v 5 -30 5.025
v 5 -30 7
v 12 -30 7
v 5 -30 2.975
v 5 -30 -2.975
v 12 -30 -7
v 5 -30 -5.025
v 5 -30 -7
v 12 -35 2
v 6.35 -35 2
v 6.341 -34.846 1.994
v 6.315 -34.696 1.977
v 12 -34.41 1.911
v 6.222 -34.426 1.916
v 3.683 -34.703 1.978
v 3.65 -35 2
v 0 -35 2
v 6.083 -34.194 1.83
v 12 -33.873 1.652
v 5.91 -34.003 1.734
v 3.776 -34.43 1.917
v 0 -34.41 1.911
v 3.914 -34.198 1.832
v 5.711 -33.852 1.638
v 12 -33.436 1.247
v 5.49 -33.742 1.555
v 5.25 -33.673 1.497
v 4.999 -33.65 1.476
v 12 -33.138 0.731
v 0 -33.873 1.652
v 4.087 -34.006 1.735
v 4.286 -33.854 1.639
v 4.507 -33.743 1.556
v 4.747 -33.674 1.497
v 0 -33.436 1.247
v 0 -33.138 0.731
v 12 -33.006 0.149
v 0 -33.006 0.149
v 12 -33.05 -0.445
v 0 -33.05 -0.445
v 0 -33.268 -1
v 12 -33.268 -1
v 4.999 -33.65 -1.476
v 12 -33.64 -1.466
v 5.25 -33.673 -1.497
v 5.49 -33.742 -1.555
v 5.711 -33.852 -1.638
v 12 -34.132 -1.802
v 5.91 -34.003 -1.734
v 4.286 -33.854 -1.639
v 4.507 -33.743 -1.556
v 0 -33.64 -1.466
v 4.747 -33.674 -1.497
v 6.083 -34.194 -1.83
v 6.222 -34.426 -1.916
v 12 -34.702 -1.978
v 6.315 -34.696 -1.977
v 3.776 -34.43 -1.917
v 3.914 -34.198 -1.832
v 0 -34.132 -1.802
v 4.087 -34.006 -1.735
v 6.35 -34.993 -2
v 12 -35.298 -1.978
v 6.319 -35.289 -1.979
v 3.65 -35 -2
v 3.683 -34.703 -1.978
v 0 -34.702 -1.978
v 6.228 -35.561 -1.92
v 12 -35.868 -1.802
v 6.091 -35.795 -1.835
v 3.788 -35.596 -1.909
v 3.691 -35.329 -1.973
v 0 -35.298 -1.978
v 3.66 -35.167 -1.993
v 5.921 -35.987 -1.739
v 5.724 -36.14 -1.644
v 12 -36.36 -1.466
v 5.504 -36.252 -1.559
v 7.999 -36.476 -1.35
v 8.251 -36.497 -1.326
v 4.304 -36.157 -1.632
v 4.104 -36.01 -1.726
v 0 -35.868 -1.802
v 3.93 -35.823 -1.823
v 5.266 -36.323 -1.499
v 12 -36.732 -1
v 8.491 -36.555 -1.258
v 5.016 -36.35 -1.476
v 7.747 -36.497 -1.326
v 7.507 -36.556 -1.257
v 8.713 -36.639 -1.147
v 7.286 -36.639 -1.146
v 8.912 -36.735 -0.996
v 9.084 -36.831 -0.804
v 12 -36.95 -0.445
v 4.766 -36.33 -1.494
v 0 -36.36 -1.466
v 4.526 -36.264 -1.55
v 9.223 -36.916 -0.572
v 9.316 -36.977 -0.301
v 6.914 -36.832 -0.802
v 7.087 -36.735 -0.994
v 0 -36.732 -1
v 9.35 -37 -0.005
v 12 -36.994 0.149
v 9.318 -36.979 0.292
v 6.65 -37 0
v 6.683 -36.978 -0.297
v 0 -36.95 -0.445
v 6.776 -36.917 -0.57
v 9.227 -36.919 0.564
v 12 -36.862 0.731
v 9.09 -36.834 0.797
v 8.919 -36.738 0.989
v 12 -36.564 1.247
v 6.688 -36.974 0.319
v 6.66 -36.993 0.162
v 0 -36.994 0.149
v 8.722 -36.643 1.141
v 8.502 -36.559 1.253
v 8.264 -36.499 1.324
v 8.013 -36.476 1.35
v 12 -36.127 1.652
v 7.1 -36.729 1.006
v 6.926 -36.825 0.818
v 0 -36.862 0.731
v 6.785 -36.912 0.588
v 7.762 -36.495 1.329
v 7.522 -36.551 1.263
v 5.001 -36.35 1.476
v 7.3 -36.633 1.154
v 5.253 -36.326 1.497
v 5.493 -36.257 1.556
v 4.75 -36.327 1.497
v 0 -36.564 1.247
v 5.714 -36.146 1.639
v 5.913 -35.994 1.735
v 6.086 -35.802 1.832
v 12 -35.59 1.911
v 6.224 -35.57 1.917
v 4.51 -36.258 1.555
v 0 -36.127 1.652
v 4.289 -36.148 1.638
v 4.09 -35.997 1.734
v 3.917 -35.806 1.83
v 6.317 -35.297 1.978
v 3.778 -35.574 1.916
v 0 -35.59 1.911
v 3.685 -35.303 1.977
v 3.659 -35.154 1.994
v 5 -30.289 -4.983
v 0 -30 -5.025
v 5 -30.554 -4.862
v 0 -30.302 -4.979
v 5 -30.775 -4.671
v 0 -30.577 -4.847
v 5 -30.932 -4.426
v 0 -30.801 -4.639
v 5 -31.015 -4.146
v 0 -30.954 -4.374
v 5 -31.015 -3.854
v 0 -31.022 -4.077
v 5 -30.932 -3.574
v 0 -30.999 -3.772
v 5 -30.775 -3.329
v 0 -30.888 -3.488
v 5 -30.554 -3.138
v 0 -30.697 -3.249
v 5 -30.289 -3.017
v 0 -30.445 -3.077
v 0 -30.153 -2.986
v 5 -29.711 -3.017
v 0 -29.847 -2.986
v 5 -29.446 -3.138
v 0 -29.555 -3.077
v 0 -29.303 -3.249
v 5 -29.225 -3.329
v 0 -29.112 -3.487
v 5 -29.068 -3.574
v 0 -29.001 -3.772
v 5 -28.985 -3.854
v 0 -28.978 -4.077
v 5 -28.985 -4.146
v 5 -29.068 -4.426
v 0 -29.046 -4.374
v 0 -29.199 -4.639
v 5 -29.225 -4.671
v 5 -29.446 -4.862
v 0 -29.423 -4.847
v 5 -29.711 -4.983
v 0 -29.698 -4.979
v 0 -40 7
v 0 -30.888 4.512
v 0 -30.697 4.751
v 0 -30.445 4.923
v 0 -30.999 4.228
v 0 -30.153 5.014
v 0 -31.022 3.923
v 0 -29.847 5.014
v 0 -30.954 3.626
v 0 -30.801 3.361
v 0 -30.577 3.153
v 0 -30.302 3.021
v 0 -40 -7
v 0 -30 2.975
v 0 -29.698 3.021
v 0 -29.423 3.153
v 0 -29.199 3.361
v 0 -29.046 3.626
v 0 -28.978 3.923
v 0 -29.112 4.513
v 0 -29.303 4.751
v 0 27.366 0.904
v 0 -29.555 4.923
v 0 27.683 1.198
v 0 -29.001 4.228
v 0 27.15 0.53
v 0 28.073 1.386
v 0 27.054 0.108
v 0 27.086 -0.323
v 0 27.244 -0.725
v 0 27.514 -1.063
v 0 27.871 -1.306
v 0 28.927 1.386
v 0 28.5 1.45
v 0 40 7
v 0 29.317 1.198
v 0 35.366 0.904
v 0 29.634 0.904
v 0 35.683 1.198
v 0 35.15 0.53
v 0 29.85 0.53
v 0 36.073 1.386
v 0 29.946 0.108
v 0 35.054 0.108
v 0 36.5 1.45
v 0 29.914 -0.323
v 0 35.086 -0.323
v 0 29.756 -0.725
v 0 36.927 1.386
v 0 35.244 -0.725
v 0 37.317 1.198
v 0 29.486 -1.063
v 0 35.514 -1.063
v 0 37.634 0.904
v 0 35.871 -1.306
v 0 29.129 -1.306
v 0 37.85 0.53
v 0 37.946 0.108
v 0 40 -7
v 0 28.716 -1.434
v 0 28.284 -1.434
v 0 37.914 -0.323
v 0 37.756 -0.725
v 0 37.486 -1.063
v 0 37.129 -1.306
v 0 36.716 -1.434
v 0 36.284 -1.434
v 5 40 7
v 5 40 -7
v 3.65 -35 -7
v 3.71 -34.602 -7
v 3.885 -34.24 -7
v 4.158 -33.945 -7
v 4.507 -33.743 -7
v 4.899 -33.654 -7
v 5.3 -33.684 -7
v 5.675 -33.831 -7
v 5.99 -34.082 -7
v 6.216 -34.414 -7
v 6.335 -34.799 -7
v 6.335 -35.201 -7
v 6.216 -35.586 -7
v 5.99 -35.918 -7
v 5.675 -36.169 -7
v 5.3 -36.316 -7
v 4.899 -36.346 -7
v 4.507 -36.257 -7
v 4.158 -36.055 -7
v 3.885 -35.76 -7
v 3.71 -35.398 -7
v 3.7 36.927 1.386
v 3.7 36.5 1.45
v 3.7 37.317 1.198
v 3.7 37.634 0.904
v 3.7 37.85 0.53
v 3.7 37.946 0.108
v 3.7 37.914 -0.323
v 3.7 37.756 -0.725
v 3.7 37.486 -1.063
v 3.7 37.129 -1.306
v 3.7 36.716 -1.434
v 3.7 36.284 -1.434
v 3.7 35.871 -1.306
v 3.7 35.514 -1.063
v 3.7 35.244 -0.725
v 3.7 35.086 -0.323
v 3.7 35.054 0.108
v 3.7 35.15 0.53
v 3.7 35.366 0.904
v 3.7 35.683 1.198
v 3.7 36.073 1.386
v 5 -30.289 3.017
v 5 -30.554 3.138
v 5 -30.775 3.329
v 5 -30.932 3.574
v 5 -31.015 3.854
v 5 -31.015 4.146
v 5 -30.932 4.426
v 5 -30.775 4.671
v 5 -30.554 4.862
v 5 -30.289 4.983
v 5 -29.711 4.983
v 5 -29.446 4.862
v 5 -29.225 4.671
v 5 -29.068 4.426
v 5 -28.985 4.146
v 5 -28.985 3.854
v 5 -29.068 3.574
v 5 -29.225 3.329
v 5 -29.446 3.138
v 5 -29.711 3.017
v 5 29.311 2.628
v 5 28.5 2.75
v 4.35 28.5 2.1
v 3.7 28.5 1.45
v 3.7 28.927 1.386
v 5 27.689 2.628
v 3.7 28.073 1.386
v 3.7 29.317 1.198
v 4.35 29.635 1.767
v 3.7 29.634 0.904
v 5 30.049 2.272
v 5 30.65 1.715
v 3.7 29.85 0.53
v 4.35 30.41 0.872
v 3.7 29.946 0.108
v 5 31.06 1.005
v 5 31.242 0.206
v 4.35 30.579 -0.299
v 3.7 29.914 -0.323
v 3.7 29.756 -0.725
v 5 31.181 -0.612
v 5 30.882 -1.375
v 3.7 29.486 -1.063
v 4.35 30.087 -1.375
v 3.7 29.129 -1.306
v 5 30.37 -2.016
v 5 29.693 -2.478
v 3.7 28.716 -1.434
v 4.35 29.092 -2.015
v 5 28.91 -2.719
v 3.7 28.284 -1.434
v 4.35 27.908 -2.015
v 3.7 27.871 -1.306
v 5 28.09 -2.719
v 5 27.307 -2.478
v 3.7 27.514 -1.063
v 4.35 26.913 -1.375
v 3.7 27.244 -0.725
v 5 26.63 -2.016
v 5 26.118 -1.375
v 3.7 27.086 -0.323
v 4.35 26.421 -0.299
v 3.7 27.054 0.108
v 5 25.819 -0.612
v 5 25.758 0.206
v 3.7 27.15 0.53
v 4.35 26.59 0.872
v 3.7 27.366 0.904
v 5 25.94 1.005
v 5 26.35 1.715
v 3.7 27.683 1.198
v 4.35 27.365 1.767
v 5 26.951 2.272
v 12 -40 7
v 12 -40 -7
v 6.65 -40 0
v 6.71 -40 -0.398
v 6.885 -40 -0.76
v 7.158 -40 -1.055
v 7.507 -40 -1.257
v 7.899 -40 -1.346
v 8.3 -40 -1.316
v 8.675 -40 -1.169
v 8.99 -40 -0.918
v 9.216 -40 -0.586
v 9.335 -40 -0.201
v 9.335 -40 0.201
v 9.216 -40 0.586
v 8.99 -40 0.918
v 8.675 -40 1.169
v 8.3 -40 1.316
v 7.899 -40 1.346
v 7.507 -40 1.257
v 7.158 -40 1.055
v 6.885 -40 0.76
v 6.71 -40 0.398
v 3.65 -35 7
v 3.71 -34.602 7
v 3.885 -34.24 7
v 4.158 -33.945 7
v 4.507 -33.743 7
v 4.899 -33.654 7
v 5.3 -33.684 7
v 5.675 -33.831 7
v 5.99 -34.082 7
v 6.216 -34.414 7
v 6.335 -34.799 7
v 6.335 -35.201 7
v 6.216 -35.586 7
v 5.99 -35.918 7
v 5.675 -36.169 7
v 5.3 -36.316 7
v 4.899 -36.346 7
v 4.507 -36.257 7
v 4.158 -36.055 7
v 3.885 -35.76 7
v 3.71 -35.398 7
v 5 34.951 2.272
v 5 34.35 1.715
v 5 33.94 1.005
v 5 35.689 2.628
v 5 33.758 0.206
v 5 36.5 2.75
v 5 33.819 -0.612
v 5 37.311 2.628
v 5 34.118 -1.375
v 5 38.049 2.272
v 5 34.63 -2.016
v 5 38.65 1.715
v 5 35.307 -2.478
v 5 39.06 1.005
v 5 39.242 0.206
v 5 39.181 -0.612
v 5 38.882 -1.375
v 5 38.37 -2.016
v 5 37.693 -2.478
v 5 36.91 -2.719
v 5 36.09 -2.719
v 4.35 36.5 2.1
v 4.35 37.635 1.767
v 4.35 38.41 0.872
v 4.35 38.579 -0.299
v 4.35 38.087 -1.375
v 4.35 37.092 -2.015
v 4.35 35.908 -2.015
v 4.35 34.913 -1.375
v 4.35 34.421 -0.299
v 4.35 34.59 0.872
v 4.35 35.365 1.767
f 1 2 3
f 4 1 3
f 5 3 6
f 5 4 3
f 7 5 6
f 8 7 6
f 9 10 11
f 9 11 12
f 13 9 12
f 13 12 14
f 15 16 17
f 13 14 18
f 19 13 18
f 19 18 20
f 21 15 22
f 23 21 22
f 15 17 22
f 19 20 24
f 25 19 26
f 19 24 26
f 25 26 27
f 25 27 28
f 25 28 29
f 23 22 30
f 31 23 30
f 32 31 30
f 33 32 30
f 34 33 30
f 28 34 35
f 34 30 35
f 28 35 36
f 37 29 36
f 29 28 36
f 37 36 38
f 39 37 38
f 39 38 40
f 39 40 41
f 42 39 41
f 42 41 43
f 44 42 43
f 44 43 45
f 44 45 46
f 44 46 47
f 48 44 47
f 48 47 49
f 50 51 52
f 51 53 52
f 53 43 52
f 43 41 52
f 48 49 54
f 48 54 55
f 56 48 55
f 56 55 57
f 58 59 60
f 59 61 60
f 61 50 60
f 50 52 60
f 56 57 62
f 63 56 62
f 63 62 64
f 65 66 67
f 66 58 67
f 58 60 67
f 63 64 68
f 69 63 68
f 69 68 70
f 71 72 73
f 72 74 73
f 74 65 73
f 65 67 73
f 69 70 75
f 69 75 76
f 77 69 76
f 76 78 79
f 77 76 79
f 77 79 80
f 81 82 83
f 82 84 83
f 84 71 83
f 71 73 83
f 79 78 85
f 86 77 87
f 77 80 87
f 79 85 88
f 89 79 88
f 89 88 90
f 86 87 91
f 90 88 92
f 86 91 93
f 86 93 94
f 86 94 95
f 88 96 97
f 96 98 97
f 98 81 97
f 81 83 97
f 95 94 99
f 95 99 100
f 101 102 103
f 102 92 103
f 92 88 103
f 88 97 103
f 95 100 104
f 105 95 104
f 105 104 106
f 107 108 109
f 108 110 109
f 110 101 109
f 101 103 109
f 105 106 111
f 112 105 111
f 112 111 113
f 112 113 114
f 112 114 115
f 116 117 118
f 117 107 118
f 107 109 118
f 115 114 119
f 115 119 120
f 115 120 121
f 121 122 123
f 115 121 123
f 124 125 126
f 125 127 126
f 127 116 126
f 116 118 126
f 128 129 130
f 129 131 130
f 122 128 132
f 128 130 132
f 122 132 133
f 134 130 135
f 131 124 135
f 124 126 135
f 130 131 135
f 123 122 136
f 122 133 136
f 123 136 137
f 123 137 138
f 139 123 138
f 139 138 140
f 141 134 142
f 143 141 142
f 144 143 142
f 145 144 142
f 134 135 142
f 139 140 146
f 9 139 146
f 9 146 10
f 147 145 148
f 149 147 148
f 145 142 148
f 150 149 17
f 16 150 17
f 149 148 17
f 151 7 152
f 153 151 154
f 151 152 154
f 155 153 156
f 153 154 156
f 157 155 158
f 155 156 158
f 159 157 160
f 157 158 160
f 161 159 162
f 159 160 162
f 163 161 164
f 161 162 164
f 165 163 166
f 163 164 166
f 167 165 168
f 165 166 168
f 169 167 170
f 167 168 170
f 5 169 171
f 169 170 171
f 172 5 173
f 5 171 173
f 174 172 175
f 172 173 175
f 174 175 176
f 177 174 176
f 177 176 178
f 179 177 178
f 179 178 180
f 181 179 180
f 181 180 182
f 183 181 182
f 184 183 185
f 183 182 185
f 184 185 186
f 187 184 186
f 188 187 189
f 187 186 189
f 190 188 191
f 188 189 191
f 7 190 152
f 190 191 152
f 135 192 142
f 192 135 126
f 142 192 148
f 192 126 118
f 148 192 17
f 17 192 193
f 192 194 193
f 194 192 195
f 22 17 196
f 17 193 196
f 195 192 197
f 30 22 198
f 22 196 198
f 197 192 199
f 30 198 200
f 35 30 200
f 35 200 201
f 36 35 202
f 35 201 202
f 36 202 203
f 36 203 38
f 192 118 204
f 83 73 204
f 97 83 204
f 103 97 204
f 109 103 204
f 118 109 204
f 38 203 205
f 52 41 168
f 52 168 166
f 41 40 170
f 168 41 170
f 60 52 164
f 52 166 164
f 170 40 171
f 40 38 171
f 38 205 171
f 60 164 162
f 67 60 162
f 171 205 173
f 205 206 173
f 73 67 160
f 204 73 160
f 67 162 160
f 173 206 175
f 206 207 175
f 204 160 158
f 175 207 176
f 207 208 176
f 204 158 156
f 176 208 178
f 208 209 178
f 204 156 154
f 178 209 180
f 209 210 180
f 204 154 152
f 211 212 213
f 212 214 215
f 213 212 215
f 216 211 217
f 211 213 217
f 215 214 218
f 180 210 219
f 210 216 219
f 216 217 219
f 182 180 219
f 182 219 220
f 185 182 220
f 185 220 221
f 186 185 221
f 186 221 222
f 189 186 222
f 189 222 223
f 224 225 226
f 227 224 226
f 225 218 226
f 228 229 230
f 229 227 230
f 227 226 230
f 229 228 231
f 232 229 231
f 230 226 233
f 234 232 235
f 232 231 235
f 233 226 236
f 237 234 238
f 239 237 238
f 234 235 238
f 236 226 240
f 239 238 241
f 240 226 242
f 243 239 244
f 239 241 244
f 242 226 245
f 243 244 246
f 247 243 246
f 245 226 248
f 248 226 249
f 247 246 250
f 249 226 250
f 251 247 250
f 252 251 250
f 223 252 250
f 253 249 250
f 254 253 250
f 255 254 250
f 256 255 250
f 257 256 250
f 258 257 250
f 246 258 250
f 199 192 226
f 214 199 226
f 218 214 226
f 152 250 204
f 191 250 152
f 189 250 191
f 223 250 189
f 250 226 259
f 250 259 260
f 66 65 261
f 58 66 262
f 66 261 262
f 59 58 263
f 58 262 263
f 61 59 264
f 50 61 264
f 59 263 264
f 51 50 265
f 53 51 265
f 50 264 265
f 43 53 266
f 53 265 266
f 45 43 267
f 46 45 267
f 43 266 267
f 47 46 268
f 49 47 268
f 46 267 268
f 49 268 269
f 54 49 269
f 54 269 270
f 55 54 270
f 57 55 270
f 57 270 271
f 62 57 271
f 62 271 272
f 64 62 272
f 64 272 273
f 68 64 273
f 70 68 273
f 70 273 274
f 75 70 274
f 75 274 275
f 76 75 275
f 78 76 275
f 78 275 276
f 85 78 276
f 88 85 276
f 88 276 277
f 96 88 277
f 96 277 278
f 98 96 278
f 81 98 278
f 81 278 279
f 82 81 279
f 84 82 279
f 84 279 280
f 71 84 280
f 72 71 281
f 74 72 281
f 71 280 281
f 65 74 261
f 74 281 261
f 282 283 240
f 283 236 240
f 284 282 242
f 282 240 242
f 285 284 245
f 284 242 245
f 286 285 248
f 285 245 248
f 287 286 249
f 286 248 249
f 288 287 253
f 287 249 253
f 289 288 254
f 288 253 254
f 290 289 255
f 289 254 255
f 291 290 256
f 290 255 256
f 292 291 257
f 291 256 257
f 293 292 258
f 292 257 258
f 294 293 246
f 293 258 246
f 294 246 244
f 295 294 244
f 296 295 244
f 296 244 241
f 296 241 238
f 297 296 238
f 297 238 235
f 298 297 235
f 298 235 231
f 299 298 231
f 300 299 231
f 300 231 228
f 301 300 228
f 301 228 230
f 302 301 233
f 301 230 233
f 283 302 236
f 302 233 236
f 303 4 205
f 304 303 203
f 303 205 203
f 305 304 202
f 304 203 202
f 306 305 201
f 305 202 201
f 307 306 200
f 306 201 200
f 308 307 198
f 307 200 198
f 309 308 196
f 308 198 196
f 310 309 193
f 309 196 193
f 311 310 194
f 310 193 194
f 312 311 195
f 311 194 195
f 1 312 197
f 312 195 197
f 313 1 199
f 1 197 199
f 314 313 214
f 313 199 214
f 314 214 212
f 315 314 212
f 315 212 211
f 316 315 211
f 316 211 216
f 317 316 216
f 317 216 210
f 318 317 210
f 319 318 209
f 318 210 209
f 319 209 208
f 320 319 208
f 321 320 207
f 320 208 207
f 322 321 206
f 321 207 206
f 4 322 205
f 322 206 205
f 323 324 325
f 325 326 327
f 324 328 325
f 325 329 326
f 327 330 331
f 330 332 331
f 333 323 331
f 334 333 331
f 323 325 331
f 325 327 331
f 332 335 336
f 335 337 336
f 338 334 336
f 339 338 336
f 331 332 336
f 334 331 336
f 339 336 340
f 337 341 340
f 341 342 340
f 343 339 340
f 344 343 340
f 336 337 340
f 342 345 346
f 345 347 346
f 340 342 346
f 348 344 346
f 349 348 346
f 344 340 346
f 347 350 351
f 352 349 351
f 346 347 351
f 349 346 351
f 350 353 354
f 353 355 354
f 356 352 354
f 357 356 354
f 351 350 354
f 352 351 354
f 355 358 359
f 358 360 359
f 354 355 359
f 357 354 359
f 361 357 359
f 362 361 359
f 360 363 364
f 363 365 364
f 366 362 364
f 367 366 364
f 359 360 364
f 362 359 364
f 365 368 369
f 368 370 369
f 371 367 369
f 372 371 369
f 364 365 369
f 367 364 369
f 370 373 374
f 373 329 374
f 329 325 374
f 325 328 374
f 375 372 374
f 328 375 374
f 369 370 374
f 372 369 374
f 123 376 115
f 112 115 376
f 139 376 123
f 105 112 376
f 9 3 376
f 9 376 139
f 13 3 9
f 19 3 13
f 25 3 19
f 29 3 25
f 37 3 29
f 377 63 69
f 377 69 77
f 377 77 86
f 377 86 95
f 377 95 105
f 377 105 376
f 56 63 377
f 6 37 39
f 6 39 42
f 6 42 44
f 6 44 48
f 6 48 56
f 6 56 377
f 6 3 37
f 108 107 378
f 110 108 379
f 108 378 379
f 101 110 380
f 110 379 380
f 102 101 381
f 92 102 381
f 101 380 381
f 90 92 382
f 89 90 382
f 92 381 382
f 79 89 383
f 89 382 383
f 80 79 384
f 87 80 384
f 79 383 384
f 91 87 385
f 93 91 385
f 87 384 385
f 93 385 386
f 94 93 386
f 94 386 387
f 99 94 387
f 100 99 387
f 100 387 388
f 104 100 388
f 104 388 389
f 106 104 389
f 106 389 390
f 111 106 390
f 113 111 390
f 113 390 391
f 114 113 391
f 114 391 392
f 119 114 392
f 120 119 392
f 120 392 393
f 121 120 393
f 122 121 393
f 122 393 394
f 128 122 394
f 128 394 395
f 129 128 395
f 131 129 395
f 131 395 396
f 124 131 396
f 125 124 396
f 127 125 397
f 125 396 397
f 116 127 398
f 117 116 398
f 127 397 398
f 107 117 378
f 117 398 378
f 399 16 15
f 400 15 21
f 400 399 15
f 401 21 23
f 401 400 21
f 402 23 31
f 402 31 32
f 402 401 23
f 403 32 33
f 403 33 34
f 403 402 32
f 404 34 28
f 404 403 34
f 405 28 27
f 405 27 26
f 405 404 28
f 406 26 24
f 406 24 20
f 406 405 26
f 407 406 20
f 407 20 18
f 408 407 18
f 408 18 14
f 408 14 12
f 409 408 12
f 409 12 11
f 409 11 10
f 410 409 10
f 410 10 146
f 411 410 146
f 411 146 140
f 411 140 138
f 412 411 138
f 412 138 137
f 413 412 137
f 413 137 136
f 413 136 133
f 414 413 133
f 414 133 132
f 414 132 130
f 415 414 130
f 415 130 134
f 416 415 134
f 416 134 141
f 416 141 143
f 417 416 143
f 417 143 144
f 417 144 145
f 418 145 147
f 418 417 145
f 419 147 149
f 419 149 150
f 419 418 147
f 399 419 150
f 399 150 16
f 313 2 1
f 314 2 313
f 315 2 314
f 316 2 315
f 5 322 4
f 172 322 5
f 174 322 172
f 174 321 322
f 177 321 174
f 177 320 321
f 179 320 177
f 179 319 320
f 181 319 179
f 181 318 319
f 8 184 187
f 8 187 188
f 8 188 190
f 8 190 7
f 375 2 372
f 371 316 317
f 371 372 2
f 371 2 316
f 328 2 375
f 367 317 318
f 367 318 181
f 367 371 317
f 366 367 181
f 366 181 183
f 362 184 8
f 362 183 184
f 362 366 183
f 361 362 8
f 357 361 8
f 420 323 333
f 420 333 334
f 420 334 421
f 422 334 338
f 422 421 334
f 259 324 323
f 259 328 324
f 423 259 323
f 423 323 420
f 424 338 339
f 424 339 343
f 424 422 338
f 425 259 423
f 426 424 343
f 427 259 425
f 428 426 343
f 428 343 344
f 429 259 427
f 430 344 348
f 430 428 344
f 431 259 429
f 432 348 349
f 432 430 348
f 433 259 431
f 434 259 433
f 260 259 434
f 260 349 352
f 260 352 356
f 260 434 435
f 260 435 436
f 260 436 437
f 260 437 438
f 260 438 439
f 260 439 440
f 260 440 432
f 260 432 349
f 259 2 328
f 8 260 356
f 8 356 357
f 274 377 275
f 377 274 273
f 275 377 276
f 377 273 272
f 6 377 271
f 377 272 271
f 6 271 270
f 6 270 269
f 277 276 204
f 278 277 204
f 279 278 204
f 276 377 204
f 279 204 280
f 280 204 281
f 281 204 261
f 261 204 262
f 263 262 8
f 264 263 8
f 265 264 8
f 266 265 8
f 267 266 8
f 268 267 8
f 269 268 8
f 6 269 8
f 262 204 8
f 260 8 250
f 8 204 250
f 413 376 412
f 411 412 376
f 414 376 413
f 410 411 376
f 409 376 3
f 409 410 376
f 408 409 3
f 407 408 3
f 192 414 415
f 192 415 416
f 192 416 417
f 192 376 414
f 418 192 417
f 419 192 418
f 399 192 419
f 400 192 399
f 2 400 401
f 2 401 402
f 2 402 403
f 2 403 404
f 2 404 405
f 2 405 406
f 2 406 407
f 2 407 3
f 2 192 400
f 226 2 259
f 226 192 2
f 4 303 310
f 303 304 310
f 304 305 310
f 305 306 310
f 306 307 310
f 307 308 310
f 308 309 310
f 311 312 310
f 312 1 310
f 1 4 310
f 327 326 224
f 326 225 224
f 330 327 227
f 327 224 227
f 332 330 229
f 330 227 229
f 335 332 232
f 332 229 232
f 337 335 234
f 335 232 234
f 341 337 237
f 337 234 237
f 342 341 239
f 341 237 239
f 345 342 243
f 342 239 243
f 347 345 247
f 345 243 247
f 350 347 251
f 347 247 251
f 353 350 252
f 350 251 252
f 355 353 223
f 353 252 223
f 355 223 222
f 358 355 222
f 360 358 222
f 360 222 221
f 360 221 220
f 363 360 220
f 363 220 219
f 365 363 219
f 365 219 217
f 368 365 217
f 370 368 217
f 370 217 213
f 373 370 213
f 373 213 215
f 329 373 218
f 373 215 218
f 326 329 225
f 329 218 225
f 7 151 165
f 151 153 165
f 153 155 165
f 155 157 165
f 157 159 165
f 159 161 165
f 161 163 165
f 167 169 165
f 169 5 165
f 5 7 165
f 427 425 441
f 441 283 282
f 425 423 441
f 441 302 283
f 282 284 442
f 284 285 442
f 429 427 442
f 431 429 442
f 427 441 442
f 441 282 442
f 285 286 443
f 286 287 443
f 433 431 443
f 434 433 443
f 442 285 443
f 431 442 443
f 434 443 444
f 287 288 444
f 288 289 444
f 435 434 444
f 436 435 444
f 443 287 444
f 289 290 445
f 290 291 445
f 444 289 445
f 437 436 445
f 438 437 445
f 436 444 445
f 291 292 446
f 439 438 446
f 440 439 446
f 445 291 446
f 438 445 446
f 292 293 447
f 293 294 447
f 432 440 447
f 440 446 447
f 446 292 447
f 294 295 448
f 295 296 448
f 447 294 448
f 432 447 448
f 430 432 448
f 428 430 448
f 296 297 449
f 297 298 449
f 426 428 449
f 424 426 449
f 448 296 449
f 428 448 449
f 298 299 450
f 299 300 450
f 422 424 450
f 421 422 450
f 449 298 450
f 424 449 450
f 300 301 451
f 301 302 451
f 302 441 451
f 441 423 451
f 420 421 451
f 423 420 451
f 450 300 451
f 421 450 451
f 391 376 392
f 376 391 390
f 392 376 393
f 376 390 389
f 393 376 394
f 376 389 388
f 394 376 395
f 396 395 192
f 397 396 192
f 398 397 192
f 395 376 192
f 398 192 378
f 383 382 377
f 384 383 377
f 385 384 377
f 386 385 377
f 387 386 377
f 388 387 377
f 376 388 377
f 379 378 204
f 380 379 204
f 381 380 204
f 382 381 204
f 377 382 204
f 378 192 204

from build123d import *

# Parameters (mm, degrees)
SKETCH_1_W                      = 14
SKETCH_1_H                      = 80
EXTRUDE_1_DEPTH                 = 5
SKETCH_14_W                     = 14
SKETCH_14_H                     = 10
EXTRUDE_2_DEPTH                 = 7
HOLE_WIZARD_M2_5_1_D            = 2.9
HOLE_WIZARD_M2_5_1_CSINK_D      = 5.5
HOLE_WIZARD_M2_5_1_CSINK_ANGLE  = 90
SKETCH_9_W                      = 1.025
SKETCH_9_H                      = 5
HOLE_WIZARD_M2_5_1_2_AT_2_COUNT = 2
HOLE_WIZARD_M2_5_1_2_AT_2_PITCH = 8
SKETCH_15_R                     = 2
CUT_EXTRUDE_2_DEPTH             = 43.343830719
F_1_0MM_2_REACH                 = 46.045
F_1_0MM_2_BORE_R                = 1.35
F_1_0MM_1_REACH                 = 83.197
F_1_0MM_1_BORE_R                = 1.35


with BuildPart() as part:
    # 草圖1 → 填料-伸長1 (new body)
    with BuildSketch(Plane(origin=(0, 0, 0), x_dir=(0, 0, -1), z_dir=(1, 0, 0))):
        Rectangle(SKETCH_1_W, SKETCH_1_H)
    extrude(amount=EXTRUDE_1_DEPTH)

    # 草圖14 → 填料-伸長2 (add)
    with BuildSketch(Plane(origin=(5, 0, 0), x_dir=(0, 0, -1), z_dir=(1, 0, 0))):
        with Locations((0, -35)):
            Rectangle(SKETCH_14_W, SKETCH_14_H)
    extrude(amount=EXTRUDE_2_DEPTH)

    # Hole Wizard M2.5 _1 (through all)
    with Locations(Plane(origin=(5, 0, 0), x_dir=(0, 0, -1), z_dir=(1, 0, 0))):
        with Locations((0, 36.5), (0, 28.5)):
            CounterSinkHole(HOLE_WIZARD_M2_5_1_D / 2, HOLE_WIZARD_M2_5_1_CSINK_D / 2, counter_sink_angle=HOLE_WIZARD_M2_5_1_CSINK_ANGLE)

    # 草圖9 → Hole Wizard M2.5 _1 2 (revolve, cut)
    with BuildSketch(Plane(origin=(5, -30, -4), x_dir=(0, 0, -1), z_dir=(0, 1, 0))):
        with Locations((0.5125, 2.5)):
            Rectangle(SKETCH_9_W, SKETCH_9_H)
    hole_wizard_m2_5_1_2 = revolve(axis=Axis((11.35, -30, -4), (-1, 0, 0)), mode=Mode.SUBTRACT)

    # Hole Wizard M2.5 _1 2 at 2: Hole Wizard M2.5 _1 2 ×2
    with Locations(*[(0, 0, i * HOLE_WIZARD_M2_5_1_2_AT_2_PITCH) for i in range(1, HOLE_WIZARD_M2_5_1_2_AT_2_COUNT)]):
        add(hole_wizard_m2_5_1_2, mode=Mode.SUBTRACT)

    # 草圖15 → 除料-伸長2 (cut, through all)
    with BuildSketch(Plane.ZY):
        with Locations((0, -35)):
            Circle(SKETCH_15_R)
    extrude(amount=-CUT_EXTRUDE_2_DEPTH, mode=Mode.SUBTRACT)

    # Ø1.0mm 定位孔2 bore → Ø1.0mm 定位孔2 (cut, up to next)
    with BuildSketch(Plane(origin=(0, 0, -7), x_dir=(-1, 0, 0), z_dir=(0, 0, -1)), mode=Mode.PRIVATE) as f_1_0mm_2_sk1:
        with Locations((-5, -35)):
            Circle(F_1_0MM_2_BORE_R)
    f_1_0mm_2_tool1 = extrude(f_1_0mm_2_sk1.sketch, amount=-F_1_0MM_2_REACH, mode=Mode.PRIVATE) & part.part
    f_1_0mm_2 = f_1_0mm_2_tool1.solids().sort_by_distance((5, -35, -7))[0]
    add(f_1_0mm_2, mode=Mode.SUBTRACT)

    # 鏡射2: Ø1.0mm 定位孔2 across plane
    add(f_1_0mm_2.mirror(Plane.XY), mode=Mode.SUBTRACT)

    # Ø1.0mm 定位孔1 bore → Ø1.0mm 定位孔1 (cut, up to next)
    with BuildSketch(Plane(origin=(0, -40, 0), x_dir=(-1, 0, 0), z_dir=(0, -1, 0)), mode=Mode.PRIVATE) as f_1_0mm_1_sk1:
        with Locations((-8, 0)):
            Circle(F_1_0MM_1_BORE_R)
    f_1_0mm_1_tool1 = extrude(f_1_0mm_1_sk1.sketch, amount=-F_1_0MM_1_REACH, mode=Mode.PRIVATE) & part.part
    add(f_1_0mm_1_tool1.solids().sort_by_distance((8, -40, 0))[0], mode=Mode.SUBTRACT)


solid = part.part
